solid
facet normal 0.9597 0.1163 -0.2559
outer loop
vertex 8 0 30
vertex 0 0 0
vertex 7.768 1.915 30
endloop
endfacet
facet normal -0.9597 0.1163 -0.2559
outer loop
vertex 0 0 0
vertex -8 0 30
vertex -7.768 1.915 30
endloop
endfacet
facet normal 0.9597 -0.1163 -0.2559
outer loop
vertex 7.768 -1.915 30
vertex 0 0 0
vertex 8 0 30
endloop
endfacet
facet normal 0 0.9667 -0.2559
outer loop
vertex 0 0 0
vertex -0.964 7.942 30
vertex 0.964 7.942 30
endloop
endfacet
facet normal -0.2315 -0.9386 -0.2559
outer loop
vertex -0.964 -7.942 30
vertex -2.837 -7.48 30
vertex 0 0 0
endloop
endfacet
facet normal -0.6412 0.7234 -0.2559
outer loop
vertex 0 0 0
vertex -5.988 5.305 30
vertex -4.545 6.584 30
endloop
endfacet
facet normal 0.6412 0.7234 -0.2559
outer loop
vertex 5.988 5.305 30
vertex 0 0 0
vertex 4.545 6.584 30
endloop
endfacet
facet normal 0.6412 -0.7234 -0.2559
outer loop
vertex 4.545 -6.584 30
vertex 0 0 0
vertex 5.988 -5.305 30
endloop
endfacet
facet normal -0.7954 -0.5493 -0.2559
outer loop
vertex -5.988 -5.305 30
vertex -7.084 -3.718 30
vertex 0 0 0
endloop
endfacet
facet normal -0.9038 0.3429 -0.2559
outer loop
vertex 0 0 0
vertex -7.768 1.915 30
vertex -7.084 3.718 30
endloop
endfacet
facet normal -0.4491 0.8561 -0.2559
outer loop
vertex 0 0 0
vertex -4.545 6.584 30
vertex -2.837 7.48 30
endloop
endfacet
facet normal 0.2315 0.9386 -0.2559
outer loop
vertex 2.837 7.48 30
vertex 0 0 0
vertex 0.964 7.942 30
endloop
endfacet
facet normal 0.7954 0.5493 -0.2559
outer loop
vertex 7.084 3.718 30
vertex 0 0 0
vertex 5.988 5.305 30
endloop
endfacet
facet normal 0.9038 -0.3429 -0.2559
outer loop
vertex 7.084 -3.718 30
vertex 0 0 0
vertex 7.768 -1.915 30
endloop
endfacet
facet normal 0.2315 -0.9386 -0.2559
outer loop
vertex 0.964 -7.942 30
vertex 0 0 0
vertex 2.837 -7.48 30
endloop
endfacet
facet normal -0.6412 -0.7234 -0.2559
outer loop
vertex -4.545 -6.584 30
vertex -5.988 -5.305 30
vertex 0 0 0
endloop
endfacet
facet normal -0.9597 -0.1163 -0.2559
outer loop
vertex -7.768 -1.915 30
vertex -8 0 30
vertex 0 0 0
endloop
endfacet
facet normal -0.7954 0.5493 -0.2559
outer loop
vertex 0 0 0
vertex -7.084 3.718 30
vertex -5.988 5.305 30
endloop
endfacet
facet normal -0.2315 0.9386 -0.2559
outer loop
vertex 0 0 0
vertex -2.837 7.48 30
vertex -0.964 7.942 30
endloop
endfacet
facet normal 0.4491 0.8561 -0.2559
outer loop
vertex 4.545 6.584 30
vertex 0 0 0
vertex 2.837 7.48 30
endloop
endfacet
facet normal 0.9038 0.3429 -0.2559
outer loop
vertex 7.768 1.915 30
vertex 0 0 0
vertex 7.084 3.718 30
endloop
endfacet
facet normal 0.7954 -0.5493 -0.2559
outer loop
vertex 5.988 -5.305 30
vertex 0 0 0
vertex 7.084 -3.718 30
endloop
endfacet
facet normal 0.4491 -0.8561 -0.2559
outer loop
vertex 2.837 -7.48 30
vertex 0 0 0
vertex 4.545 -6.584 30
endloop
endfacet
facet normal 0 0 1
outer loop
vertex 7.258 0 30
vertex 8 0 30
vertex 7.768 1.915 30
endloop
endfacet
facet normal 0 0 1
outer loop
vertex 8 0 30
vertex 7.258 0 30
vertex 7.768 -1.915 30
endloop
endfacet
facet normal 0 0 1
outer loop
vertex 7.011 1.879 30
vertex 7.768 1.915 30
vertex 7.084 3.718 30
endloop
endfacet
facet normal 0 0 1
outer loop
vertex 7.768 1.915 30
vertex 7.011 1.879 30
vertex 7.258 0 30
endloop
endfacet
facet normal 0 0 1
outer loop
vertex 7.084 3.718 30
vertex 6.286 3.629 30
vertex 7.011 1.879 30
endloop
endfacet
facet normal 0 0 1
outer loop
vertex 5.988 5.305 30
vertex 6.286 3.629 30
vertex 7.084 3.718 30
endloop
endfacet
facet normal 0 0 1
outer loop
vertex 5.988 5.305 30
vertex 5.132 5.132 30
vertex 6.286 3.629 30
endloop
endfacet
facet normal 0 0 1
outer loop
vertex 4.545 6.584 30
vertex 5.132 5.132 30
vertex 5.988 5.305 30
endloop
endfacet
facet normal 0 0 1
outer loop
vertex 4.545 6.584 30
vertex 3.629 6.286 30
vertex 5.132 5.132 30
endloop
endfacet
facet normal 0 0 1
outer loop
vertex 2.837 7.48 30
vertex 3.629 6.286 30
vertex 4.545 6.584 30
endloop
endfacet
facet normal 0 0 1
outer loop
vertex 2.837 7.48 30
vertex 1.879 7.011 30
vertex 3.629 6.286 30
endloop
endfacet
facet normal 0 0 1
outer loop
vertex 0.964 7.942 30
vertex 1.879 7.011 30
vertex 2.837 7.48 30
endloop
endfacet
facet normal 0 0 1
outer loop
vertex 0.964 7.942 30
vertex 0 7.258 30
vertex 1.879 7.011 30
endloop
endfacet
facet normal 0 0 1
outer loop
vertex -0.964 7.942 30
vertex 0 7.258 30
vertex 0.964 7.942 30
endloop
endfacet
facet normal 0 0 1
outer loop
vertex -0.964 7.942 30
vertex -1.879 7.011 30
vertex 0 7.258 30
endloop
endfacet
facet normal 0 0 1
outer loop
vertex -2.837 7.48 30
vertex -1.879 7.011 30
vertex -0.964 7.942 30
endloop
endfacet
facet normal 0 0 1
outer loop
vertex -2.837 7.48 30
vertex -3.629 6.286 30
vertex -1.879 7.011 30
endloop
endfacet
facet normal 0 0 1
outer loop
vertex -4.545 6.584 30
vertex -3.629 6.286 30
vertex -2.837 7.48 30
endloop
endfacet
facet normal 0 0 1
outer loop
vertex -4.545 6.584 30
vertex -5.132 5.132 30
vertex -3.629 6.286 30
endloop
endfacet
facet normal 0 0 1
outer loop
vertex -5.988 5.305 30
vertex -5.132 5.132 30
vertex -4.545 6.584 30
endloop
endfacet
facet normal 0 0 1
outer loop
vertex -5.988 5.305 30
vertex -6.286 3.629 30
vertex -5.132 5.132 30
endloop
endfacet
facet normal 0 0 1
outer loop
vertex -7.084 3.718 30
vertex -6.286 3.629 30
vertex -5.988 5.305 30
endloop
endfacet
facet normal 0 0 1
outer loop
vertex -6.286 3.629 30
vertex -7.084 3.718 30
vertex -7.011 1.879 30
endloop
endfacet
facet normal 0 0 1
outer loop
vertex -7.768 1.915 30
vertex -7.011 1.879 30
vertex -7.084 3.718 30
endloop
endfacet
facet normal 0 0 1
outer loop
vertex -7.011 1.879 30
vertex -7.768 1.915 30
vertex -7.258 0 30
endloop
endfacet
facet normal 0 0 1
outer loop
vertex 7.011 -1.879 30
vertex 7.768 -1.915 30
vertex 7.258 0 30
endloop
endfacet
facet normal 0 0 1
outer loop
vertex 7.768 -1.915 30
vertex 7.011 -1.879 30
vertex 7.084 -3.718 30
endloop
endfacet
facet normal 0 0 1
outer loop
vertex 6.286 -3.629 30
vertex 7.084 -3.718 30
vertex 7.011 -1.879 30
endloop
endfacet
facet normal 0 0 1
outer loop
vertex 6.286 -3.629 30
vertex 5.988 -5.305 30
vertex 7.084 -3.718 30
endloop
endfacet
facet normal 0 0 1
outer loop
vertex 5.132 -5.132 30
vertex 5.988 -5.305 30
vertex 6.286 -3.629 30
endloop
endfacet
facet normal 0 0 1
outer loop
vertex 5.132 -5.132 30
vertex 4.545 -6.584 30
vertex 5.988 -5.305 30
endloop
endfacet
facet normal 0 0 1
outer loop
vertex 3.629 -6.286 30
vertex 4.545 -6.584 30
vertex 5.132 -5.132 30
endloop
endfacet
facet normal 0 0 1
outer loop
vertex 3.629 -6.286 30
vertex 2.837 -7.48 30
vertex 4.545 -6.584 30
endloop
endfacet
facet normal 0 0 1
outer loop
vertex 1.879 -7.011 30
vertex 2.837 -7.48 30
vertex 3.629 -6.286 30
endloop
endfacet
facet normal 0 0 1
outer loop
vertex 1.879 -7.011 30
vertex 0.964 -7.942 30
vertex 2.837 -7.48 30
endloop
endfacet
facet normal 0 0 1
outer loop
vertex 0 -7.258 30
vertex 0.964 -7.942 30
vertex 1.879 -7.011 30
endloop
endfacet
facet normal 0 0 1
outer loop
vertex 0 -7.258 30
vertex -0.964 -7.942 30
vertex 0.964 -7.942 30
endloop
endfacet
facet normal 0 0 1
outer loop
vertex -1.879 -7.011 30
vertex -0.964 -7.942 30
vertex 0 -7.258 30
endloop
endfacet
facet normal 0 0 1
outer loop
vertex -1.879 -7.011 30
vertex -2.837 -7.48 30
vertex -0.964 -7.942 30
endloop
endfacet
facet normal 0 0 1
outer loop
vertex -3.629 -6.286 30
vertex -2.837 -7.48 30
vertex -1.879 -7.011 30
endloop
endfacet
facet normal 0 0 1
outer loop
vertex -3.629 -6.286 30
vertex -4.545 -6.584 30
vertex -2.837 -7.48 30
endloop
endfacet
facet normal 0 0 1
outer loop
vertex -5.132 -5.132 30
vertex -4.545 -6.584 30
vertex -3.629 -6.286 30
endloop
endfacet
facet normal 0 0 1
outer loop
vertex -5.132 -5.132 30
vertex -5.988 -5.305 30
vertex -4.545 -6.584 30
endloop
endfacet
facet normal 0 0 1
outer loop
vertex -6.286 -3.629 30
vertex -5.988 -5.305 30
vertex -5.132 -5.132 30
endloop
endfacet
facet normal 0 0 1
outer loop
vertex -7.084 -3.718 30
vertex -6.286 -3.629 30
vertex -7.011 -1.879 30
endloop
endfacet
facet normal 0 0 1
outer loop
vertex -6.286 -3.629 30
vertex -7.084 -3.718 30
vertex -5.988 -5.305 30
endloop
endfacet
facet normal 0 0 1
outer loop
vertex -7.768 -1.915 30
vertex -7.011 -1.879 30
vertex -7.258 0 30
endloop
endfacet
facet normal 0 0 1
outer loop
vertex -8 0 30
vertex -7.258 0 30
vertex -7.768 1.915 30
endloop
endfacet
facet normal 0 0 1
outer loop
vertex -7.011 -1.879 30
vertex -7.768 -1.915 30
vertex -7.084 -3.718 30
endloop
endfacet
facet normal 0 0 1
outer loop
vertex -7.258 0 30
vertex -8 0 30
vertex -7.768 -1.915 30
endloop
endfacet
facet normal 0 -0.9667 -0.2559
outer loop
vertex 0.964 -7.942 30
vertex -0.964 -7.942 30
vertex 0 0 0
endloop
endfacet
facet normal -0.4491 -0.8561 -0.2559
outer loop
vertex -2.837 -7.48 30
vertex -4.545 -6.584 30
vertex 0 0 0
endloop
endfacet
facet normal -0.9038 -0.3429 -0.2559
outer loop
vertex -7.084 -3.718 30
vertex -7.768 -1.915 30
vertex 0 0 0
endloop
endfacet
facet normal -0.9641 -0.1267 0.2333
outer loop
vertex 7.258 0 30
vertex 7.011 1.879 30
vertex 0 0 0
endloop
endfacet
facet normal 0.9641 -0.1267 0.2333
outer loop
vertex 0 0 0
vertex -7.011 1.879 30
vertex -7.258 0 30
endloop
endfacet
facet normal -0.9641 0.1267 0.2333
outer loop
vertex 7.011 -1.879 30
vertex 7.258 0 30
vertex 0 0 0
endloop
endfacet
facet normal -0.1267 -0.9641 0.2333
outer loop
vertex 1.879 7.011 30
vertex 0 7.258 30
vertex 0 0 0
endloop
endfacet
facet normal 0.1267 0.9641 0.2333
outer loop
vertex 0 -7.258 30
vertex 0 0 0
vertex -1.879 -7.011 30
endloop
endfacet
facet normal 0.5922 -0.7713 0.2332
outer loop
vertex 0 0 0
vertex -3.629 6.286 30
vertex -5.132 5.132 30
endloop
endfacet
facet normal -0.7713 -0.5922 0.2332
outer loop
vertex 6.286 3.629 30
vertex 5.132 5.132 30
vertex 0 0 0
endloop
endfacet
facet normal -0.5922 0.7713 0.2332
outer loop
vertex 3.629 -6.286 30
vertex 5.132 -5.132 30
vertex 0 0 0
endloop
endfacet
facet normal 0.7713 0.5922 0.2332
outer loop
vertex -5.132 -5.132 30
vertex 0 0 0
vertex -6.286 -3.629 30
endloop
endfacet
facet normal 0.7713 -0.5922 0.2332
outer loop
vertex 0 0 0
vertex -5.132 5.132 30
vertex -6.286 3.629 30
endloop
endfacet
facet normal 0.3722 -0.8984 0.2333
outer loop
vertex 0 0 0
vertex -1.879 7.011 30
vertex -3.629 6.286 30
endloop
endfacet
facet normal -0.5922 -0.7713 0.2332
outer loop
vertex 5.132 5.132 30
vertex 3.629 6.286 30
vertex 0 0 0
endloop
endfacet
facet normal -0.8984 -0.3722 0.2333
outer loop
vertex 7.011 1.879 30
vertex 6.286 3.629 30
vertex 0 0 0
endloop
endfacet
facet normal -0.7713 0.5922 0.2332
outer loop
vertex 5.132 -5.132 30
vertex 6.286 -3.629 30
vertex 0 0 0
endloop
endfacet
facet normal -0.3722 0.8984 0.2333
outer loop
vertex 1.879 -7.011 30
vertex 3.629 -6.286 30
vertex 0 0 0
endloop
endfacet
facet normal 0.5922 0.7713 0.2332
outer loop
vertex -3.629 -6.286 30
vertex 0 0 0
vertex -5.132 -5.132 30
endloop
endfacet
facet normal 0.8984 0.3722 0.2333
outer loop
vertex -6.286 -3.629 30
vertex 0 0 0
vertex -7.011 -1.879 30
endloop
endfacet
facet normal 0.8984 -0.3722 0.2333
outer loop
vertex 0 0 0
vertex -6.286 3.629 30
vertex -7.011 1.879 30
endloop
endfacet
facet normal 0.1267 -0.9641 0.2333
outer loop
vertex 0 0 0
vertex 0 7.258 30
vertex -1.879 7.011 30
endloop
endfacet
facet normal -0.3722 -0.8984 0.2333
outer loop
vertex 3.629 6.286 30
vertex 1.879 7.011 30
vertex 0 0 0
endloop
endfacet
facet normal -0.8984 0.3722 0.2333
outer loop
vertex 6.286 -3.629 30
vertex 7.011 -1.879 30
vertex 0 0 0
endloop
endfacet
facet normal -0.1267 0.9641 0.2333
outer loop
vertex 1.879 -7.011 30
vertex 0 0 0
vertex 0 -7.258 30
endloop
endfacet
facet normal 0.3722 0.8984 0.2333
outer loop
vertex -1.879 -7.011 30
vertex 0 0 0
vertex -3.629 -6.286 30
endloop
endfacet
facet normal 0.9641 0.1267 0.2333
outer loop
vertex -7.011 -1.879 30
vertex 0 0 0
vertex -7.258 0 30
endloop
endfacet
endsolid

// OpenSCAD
difference() {
    //Outside Cone
    cylinder(30, 0, 8);

    //Inside Cone
    cylinder(31, 0, 7.5);
    }
